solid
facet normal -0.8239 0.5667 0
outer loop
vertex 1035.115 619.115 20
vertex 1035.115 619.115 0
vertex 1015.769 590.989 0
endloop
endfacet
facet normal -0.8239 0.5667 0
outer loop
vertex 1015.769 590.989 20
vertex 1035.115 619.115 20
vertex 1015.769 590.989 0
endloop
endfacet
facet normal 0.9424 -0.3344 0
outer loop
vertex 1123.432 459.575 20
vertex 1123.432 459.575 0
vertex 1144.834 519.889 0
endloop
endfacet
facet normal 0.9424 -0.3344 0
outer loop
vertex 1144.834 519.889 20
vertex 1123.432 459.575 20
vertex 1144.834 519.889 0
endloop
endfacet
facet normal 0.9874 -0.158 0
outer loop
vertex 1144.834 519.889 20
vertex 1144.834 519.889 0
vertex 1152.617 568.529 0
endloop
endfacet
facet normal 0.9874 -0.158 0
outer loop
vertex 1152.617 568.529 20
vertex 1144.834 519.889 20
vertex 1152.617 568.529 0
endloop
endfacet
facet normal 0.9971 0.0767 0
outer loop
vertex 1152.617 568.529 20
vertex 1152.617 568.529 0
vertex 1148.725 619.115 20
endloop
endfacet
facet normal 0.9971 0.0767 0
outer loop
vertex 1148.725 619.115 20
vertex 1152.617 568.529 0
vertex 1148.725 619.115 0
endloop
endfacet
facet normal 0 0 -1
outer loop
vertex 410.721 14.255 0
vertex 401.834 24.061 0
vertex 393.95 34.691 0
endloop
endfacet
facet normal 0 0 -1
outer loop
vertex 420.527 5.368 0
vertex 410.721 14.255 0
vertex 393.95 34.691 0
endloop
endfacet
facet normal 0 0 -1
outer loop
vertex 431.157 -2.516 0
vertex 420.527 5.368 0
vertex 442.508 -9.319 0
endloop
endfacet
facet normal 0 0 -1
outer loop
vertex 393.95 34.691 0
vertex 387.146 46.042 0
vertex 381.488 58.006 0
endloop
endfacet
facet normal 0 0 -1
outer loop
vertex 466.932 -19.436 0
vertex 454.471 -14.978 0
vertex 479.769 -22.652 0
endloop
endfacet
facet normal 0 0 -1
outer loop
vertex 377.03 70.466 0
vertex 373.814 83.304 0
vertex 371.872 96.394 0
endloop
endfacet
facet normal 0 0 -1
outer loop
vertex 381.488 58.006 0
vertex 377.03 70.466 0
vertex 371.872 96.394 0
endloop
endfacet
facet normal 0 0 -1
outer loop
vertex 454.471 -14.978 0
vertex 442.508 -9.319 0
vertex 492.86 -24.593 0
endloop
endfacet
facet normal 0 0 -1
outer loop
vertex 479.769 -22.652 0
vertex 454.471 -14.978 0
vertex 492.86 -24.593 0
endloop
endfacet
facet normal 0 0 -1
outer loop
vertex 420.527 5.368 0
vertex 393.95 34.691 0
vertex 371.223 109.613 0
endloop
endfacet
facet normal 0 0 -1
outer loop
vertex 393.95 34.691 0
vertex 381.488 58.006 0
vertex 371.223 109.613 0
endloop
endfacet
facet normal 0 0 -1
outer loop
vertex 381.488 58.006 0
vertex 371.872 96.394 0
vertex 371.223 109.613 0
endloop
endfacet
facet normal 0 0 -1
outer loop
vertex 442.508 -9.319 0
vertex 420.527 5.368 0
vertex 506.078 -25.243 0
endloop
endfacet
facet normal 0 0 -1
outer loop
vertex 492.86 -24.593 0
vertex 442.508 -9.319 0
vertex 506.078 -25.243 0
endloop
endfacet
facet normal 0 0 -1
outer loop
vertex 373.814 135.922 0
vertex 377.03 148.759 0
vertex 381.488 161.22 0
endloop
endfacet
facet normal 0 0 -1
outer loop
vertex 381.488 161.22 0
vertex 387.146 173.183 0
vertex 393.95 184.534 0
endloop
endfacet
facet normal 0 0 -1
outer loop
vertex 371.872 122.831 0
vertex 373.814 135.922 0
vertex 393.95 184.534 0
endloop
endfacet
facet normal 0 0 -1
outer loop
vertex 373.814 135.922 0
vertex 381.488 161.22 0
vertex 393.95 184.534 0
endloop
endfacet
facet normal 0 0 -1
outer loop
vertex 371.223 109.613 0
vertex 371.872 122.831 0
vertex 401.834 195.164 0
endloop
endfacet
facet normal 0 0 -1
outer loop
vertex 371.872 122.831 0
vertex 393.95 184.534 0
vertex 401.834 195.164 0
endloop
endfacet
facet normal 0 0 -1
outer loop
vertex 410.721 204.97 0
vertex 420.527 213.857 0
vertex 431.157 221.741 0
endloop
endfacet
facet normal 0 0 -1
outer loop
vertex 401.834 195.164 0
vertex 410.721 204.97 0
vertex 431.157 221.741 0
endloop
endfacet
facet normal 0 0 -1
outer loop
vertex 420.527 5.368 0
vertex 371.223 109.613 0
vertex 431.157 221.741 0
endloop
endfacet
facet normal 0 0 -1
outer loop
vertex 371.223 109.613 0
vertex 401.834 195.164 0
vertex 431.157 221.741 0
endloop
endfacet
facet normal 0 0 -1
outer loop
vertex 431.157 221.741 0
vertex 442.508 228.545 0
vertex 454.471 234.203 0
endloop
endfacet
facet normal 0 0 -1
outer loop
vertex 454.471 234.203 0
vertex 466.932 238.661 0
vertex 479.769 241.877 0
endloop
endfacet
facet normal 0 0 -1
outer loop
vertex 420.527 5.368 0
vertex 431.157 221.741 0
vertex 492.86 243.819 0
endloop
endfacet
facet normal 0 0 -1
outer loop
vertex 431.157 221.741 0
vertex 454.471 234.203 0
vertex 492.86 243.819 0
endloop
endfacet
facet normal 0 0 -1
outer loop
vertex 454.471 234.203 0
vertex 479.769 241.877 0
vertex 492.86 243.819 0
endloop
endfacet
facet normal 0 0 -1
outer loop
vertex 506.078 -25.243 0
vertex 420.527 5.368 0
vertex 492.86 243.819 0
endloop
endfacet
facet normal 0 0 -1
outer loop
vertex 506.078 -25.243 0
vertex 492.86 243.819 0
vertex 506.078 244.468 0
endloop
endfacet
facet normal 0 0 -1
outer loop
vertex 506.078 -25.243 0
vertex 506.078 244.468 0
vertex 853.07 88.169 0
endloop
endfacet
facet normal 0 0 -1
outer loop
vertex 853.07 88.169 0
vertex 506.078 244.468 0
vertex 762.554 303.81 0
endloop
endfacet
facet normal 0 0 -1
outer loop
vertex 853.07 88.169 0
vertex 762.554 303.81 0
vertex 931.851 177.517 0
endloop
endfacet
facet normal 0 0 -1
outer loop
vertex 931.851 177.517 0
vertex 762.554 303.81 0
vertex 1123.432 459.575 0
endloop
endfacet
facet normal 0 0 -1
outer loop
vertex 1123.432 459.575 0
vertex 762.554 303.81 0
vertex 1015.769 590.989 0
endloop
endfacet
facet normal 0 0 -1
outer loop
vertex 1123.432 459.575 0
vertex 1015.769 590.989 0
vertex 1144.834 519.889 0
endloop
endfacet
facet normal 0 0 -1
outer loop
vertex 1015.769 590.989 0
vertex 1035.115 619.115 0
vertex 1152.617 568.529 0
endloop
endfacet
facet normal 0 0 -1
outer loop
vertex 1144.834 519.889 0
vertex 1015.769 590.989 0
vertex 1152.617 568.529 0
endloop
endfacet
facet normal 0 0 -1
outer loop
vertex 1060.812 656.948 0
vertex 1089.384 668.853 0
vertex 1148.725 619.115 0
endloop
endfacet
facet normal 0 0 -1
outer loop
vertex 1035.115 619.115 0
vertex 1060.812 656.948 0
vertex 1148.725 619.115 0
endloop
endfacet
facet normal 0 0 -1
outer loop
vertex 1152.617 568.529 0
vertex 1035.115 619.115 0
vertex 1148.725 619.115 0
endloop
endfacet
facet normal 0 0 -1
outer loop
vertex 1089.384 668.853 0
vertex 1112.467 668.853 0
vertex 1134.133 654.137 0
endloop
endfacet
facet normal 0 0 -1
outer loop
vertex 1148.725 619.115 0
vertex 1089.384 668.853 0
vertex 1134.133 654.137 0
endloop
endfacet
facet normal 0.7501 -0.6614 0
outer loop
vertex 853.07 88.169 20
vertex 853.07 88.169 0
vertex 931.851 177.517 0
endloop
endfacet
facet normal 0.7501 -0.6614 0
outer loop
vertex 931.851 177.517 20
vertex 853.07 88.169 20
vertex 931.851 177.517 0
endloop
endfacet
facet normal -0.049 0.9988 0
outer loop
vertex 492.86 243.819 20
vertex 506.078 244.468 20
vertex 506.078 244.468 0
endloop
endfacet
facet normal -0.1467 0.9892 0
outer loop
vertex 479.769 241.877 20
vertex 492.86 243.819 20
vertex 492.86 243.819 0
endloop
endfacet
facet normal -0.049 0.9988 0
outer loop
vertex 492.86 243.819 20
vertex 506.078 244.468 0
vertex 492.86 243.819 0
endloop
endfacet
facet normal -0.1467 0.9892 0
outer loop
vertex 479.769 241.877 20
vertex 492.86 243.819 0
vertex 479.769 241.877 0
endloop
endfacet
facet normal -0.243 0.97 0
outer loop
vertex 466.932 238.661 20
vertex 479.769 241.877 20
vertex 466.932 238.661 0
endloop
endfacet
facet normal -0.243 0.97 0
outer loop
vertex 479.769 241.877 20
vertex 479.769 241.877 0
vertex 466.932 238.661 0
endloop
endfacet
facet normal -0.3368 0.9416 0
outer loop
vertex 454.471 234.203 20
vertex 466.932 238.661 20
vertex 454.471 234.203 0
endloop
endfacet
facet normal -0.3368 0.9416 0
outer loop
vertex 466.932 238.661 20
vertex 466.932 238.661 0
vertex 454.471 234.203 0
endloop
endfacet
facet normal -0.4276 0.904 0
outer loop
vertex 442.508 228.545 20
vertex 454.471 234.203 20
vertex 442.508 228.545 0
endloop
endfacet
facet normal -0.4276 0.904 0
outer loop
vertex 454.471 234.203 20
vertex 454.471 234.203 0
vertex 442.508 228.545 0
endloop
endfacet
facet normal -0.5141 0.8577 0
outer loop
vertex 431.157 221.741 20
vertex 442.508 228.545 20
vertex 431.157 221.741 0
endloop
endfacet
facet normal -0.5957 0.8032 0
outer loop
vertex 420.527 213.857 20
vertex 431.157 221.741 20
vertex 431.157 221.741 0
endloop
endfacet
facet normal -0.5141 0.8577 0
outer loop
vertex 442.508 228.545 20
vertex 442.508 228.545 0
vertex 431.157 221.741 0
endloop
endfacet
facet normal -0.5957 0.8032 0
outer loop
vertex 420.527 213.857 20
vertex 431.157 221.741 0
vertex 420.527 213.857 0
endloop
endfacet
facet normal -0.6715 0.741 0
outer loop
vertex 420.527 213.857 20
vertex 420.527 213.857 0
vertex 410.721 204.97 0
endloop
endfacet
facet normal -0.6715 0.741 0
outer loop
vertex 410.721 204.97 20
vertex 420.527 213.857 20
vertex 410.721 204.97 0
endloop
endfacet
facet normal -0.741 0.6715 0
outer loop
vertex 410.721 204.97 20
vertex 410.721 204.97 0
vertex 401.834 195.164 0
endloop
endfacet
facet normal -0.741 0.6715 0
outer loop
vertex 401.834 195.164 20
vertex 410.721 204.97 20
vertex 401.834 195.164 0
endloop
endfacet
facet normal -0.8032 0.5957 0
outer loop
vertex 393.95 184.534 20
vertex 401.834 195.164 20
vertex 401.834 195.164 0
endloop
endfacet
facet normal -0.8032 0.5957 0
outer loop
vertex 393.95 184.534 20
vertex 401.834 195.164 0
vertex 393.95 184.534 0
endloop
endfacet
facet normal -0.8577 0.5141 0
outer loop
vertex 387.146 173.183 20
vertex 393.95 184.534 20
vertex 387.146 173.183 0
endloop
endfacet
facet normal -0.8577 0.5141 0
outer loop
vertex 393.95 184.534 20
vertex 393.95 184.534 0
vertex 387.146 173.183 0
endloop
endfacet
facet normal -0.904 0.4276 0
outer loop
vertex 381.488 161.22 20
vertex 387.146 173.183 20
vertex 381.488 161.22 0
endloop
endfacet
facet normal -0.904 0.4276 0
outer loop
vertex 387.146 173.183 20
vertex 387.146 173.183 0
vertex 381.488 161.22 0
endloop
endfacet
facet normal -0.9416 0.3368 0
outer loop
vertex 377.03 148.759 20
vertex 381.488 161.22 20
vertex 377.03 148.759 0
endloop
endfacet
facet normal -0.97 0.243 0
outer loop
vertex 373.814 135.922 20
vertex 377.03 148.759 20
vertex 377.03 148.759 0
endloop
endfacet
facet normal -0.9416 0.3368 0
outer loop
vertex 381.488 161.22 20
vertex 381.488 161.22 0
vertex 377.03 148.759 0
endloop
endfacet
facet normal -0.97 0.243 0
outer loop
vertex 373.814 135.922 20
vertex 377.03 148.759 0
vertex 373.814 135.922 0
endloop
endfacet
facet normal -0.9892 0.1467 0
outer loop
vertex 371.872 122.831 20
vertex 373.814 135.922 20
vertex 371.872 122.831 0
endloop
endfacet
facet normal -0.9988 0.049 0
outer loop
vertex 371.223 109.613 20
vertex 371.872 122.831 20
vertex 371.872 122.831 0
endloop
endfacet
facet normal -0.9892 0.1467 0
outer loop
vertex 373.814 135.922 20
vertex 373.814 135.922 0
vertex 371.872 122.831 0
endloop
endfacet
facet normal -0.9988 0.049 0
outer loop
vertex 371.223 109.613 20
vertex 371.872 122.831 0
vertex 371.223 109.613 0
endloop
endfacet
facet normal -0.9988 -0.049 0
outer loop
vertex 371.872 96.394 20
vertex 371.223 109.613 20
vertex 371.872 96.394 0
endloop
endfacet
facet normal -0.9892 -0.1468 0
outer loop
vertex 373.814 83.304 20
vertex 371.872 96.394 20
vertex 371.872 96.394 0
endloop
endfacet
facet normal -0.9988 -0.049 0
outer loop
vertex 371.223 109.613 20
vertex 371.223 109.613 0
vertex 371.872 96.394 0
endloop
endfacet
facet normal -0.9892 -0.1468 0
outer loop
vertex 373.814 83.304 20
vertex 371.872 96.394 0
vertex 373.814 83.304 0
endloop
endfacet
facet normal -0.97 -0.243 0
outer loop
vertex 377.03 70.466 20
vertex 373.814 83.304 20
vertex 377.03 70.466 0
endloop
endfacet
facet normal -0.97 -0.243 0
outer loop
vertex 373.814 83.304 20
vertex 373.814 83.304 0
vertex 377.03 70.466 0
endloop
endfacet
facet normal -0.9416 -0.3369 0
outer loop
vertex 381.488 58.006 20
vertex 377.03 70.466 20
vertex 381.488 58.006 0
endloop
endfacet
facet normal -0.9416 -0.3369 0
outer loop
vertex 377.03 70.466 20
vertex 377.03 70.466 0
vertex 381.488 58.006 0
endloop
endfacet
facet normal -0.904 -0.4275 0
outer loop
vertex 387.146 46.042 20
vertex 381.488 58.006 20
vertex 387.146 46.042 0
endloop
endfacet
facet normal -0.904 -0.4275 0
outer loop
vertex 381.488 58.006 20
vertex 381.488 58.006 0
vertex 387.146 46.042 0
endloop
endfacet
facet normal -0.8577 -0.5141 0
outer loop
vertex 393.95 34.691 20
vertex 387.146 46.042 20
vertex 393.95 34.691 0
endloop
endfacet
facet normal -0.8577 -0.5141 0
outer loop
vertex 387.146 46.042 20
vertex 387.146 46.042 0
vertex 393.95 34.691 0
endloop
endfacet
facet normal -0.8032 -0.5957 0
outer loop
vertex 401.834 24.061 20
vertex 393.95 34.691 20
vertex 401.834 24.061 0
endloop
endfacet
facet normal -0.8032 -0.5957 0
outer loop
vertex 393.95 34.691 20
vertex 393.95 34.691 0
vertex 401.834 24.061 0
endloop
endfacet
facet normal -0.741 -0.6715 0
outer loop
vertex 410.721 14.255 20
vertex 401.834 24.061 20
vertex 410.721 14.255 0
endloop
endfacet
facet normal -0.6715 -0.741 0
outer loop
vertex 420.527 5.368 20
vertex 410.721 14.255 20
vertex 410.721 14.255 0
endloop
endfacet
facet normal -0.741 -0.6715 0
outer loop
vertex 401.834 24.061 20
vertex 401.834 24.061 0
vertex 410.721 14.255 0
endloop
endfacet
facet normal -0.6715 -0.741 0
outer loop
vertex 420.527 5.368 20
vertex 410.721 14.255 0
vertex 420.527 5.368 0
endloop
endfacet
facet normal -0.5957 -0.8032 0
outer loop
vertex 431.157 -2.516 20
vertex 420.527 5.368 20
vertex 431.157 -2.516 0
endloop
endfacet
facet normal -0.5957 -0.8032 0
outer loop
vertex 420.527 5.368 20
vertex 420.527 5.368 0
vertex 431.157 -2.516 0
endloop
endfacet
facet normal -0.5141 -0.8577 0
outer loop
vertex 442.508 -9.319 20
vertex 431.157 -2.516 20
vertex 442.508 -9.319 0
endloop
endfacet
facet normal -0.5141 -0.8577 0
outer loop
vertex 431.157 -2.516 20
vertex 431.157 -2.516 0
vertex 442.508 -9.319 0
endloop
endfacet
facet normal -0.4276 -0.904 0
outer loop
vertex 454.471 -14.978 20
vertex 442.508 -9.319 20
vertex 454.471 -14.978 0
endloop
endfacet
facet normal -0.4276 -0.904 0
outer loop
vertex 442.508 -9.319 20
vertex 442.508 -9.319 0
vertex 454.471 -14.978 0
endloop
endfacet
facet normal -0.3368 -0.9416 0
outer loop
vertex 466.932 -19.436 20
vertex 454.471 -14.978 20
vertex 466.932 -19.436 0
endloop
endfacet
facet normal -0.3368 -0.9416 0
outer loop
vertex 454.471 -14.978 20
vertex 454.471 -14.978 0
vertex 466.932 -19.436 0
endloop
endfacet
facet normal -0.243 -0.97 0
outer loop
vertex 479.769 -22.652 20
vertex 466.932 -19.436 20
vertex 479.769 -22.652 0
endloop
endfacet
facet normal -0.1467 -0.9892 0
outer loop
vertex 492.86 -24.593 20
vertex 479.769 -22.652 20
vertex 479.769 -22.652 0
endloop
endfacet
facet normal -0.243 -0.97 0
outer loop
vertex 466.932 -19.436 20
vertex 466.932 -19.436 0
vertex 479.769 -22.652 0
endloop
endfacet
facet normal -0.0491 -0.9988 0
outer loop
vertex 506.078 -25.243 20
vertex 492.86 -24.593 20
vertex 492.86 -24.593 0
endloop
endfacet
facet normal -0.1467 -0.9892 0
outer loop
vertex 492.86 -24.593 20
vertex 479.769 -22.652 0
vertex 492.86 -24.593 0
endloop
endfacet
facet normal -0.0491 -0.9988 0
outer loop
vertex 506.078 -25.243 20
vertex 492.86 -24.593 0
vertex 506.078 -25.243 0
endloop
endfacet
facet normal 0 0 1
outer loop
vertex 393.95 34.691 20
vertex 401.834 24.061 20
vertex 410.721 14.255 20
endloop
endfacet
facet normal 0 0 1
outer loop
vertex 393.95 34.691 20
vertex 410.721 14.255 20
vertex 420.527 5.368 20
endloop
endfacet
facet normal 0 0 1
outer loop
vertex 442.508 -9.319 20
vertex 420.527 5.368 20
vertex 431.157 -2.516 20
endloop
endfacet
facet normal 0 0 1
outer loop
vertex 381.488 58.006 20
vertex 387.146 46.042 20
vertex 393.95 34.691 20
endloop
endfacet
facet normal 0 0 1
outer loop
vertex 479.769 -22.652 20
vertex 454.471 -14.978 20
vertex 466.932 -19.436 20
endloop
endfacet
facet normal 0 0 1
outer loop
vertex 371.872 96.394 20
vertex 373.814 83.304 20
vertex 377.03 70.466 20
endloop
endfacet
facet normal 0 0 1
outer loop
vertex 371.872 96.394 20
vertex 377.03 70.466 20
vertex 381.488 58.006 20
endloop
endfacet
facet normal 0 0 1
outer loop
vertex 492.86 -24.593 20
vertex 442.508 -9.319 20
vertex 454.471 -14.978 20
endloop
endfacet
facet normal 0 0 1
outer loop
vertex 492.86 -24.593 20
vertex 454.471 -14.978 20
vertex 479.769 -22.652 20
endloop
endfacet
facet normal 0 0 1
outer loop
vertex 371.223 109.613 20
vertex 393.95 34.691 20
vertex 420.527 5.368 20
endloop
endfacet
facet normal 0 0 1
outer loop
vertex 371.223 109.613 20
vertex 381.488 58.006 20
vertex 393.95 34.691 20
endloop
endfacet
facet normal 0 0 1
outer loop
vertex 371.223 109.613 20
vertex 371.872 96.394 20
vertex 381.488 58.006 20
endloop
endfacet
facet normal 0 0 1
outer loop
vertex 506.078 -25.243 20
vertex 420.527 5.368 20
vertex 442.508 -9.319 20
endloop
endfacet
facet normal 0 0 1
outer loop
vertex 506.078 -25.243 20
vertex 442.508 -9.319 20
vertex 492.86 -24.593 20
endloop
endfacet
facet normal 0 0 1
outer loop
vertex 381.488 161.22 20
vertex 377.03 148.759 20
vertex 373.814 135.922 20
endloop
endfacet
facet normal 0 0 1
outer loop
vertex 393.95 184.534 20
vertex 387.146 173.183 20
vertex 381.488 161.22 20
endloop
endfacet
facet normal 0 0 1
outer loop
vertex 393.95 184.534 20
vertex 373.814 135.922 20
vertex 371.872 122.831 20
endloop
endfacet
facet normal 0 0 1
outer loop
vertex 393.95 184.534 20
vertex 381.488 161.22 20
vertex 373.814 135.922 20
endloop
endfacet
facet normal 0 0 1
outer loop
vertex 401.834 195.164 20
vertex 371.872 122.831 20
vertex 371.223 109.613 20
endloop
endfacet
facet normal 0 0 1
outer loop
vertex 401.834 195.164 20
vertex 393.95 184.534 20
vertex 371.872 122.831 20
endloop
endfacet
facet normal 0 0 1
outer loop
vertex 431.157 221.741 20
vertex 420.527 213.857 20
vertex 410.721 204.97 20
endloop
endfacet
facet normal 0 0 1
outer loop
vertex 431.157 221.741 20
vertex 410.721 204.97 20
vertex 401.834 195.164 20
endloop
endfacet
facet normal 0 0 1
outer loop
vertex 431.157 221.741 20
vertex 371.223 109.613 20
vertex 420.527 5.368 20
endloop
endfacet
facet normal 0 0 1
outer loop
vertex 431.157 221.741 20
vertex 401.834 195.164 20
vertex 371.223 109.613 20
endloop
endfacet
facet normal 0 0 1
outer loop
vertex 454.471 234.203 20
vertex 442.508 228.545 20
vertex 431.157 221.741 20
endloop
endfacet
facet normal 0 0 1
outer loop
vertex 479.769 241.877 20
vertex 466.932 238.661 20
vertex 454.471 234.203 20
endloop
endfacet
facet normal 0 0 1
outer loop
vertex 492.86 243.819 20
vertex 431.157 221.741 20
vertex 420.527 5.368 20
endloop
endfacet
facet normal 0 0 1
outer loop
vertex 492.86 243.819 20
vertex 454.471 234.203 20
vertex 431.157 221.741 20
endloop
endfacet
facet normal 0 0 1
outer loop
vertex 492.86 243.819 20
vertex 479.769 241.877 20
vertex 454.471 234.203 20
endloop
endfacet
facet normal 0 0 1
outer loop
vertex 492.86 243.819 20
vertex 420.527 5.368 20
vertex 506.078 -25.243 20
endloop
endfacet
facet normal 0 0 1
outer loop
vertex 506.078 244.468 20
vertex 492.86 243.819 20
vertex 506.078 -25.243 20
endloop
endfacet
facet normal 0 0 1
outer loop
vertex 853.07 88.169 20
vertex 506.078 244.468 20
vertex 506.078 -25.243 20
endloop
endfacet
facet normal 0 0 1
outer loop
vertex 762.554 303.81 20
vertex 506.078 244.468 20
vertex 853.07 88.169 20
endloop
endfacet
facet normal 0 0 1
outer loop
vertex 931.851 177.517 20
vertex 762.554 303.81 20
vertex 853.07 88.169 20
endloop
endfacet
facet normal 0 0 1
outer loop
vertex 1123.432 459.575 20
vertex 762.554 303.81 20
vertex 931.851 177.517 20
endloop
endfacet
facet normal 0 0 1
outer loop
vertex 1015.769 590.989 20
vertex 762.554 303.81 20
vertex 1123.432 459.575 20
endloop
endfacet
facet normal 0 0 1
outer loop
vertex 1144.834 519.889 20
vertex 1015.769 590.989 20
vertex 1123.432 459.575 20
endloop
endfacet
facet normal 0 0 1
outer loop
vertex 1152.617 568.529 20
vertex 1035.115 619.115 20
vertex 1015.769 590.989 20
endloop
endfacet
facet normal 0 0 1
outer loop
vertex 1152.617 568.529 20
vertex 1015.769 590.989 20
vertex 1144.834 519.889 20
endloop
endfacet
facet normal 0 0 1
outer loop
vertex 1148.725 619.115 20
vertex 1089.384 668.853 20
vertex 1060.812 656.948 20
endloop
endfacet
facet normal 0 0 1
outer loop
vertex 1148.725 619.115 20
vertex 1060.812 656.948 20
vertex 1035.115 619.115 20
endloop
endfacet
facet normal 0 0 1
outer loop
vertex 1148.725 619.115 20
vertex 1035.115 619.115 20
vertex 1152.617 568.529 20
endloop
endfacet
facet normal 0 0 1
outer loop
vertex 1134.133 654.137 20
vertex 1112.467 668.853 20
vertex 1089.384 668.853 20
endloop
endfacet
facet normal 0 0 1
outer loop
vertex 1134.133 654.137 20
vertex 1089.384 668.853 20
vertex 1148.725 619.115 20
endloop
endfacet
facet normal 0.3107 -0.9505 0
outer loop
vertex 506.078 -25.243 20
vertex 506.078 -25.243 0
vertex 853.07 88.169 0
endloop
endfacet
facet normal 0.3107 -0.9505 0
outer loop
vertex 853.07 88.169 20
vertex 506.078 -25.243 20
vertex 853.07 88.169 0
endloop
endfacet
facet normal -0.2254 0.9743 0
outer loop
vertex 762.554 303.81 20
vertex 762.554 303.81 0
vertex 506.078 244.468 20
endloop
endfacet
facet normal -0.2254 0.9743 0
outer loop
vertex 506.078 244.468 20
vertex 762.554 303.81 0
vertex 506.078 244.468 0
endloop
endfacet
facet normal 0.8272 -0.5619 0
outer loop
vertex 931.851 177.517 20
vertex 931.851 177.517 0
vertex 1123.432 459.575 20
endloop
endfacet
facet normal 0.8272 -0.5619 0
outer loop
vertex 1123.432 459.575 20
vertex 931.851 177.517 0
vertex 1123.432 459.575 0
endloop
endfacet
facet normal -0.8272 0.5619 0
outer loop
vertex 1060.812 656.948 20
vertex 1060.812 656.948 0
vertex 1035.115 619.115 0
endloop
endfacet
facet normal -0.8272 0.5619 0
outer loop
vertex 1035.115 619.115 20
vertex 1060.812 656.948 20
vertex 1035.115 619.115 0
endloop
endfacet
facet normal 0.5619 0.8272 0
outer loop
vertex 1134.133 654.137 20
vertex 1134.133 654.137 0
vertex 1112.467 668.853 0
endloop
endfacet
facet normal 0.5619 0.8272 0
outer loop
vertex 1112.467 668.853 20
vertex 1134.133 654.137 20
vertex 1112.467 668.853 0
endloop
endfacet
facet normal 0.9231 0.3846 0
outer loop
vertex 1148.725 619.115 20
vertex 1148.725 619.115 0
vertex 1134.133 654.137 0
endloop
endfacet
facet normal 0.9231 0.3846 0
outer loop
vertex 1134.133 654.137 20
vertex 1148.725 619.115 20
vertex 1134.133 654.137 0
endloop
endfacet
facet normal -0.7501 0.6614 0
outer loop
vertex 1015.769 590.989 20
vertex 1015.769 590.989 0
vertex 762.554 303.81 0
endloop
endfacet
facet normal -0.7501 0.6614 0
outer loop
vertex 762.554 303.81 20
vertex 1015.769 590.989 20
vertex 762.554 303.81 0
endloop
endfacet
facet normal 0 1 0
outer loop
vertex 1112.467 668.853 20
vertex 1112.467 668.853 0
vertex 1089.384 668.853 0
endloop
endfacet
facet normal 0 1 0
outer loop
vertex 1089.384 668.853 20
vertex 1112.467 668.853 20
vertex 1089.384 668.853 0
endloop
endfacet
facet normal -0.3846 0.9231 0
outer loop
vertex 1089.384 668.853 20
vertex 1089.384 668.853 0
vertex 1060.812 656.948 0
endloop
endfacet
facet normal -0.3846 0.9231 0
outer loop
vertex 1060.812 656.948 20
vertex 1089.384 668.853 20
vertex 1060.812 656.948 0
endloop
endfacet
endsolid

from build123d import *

# Parameters (mm, degrees)
SALIENTE_EXTRUIR1_DEPTH = 20


with BuildPart() as part:
    # Croquis1 → Saliente-Extruir1 (new body)
    with BuildSketch(Plane.XY):
        with BuildLine():
            Line((853.07011629, 88.169264479), (931.851074637, 177.517253669))
            Line((931.851074637, 177.517253669), (1123.432307328, 459.574764509))
            Line((1123.432307328, 459.574764509), (1144.834105581, 519.888923222))
            Line((1144.834105581, 519.888923222), (1152.616577673, 568.529373797))
            Line((1152.616577673, 568.529373797), (1148.725341627, 619.115442395))
            Line((1148.725341627, 619.115442395), (1134.133206454, 654.13656681))
            Line((1134.133206454, 654.13656681), (1112.467017385, 668.852839378))
            Line((1112.467017385, 668.852839378), (1089.383991925, 668.852839378))
            Line((1089.383991925, 668.852839378), (1060.811863494, 656.947785866))
            Line((1060.811863494, 656.947785866), (1035.115093442, 619.115442395))
            Line((1035.115093442, 619.115442395), (1015.768853134, 590.989004825))
            Line((1015.768853134, 590.989004825), (762.554169484, 303.810182778))
            Line((762.554169484, 303.810182778), (506.078323887, 244.468113377))
            ThreePointArc((506.078323887, 244.468113377), (371.222836086, 109.612625576), (506.078323887, -25.242862225))
            Line((506.078323887, -25.242862225), (853.07011629, 88.169264479))
        make_face()
    extrude(amount=SALIENTE_EXTRUIR1_DEPTH)


solid = part.part
